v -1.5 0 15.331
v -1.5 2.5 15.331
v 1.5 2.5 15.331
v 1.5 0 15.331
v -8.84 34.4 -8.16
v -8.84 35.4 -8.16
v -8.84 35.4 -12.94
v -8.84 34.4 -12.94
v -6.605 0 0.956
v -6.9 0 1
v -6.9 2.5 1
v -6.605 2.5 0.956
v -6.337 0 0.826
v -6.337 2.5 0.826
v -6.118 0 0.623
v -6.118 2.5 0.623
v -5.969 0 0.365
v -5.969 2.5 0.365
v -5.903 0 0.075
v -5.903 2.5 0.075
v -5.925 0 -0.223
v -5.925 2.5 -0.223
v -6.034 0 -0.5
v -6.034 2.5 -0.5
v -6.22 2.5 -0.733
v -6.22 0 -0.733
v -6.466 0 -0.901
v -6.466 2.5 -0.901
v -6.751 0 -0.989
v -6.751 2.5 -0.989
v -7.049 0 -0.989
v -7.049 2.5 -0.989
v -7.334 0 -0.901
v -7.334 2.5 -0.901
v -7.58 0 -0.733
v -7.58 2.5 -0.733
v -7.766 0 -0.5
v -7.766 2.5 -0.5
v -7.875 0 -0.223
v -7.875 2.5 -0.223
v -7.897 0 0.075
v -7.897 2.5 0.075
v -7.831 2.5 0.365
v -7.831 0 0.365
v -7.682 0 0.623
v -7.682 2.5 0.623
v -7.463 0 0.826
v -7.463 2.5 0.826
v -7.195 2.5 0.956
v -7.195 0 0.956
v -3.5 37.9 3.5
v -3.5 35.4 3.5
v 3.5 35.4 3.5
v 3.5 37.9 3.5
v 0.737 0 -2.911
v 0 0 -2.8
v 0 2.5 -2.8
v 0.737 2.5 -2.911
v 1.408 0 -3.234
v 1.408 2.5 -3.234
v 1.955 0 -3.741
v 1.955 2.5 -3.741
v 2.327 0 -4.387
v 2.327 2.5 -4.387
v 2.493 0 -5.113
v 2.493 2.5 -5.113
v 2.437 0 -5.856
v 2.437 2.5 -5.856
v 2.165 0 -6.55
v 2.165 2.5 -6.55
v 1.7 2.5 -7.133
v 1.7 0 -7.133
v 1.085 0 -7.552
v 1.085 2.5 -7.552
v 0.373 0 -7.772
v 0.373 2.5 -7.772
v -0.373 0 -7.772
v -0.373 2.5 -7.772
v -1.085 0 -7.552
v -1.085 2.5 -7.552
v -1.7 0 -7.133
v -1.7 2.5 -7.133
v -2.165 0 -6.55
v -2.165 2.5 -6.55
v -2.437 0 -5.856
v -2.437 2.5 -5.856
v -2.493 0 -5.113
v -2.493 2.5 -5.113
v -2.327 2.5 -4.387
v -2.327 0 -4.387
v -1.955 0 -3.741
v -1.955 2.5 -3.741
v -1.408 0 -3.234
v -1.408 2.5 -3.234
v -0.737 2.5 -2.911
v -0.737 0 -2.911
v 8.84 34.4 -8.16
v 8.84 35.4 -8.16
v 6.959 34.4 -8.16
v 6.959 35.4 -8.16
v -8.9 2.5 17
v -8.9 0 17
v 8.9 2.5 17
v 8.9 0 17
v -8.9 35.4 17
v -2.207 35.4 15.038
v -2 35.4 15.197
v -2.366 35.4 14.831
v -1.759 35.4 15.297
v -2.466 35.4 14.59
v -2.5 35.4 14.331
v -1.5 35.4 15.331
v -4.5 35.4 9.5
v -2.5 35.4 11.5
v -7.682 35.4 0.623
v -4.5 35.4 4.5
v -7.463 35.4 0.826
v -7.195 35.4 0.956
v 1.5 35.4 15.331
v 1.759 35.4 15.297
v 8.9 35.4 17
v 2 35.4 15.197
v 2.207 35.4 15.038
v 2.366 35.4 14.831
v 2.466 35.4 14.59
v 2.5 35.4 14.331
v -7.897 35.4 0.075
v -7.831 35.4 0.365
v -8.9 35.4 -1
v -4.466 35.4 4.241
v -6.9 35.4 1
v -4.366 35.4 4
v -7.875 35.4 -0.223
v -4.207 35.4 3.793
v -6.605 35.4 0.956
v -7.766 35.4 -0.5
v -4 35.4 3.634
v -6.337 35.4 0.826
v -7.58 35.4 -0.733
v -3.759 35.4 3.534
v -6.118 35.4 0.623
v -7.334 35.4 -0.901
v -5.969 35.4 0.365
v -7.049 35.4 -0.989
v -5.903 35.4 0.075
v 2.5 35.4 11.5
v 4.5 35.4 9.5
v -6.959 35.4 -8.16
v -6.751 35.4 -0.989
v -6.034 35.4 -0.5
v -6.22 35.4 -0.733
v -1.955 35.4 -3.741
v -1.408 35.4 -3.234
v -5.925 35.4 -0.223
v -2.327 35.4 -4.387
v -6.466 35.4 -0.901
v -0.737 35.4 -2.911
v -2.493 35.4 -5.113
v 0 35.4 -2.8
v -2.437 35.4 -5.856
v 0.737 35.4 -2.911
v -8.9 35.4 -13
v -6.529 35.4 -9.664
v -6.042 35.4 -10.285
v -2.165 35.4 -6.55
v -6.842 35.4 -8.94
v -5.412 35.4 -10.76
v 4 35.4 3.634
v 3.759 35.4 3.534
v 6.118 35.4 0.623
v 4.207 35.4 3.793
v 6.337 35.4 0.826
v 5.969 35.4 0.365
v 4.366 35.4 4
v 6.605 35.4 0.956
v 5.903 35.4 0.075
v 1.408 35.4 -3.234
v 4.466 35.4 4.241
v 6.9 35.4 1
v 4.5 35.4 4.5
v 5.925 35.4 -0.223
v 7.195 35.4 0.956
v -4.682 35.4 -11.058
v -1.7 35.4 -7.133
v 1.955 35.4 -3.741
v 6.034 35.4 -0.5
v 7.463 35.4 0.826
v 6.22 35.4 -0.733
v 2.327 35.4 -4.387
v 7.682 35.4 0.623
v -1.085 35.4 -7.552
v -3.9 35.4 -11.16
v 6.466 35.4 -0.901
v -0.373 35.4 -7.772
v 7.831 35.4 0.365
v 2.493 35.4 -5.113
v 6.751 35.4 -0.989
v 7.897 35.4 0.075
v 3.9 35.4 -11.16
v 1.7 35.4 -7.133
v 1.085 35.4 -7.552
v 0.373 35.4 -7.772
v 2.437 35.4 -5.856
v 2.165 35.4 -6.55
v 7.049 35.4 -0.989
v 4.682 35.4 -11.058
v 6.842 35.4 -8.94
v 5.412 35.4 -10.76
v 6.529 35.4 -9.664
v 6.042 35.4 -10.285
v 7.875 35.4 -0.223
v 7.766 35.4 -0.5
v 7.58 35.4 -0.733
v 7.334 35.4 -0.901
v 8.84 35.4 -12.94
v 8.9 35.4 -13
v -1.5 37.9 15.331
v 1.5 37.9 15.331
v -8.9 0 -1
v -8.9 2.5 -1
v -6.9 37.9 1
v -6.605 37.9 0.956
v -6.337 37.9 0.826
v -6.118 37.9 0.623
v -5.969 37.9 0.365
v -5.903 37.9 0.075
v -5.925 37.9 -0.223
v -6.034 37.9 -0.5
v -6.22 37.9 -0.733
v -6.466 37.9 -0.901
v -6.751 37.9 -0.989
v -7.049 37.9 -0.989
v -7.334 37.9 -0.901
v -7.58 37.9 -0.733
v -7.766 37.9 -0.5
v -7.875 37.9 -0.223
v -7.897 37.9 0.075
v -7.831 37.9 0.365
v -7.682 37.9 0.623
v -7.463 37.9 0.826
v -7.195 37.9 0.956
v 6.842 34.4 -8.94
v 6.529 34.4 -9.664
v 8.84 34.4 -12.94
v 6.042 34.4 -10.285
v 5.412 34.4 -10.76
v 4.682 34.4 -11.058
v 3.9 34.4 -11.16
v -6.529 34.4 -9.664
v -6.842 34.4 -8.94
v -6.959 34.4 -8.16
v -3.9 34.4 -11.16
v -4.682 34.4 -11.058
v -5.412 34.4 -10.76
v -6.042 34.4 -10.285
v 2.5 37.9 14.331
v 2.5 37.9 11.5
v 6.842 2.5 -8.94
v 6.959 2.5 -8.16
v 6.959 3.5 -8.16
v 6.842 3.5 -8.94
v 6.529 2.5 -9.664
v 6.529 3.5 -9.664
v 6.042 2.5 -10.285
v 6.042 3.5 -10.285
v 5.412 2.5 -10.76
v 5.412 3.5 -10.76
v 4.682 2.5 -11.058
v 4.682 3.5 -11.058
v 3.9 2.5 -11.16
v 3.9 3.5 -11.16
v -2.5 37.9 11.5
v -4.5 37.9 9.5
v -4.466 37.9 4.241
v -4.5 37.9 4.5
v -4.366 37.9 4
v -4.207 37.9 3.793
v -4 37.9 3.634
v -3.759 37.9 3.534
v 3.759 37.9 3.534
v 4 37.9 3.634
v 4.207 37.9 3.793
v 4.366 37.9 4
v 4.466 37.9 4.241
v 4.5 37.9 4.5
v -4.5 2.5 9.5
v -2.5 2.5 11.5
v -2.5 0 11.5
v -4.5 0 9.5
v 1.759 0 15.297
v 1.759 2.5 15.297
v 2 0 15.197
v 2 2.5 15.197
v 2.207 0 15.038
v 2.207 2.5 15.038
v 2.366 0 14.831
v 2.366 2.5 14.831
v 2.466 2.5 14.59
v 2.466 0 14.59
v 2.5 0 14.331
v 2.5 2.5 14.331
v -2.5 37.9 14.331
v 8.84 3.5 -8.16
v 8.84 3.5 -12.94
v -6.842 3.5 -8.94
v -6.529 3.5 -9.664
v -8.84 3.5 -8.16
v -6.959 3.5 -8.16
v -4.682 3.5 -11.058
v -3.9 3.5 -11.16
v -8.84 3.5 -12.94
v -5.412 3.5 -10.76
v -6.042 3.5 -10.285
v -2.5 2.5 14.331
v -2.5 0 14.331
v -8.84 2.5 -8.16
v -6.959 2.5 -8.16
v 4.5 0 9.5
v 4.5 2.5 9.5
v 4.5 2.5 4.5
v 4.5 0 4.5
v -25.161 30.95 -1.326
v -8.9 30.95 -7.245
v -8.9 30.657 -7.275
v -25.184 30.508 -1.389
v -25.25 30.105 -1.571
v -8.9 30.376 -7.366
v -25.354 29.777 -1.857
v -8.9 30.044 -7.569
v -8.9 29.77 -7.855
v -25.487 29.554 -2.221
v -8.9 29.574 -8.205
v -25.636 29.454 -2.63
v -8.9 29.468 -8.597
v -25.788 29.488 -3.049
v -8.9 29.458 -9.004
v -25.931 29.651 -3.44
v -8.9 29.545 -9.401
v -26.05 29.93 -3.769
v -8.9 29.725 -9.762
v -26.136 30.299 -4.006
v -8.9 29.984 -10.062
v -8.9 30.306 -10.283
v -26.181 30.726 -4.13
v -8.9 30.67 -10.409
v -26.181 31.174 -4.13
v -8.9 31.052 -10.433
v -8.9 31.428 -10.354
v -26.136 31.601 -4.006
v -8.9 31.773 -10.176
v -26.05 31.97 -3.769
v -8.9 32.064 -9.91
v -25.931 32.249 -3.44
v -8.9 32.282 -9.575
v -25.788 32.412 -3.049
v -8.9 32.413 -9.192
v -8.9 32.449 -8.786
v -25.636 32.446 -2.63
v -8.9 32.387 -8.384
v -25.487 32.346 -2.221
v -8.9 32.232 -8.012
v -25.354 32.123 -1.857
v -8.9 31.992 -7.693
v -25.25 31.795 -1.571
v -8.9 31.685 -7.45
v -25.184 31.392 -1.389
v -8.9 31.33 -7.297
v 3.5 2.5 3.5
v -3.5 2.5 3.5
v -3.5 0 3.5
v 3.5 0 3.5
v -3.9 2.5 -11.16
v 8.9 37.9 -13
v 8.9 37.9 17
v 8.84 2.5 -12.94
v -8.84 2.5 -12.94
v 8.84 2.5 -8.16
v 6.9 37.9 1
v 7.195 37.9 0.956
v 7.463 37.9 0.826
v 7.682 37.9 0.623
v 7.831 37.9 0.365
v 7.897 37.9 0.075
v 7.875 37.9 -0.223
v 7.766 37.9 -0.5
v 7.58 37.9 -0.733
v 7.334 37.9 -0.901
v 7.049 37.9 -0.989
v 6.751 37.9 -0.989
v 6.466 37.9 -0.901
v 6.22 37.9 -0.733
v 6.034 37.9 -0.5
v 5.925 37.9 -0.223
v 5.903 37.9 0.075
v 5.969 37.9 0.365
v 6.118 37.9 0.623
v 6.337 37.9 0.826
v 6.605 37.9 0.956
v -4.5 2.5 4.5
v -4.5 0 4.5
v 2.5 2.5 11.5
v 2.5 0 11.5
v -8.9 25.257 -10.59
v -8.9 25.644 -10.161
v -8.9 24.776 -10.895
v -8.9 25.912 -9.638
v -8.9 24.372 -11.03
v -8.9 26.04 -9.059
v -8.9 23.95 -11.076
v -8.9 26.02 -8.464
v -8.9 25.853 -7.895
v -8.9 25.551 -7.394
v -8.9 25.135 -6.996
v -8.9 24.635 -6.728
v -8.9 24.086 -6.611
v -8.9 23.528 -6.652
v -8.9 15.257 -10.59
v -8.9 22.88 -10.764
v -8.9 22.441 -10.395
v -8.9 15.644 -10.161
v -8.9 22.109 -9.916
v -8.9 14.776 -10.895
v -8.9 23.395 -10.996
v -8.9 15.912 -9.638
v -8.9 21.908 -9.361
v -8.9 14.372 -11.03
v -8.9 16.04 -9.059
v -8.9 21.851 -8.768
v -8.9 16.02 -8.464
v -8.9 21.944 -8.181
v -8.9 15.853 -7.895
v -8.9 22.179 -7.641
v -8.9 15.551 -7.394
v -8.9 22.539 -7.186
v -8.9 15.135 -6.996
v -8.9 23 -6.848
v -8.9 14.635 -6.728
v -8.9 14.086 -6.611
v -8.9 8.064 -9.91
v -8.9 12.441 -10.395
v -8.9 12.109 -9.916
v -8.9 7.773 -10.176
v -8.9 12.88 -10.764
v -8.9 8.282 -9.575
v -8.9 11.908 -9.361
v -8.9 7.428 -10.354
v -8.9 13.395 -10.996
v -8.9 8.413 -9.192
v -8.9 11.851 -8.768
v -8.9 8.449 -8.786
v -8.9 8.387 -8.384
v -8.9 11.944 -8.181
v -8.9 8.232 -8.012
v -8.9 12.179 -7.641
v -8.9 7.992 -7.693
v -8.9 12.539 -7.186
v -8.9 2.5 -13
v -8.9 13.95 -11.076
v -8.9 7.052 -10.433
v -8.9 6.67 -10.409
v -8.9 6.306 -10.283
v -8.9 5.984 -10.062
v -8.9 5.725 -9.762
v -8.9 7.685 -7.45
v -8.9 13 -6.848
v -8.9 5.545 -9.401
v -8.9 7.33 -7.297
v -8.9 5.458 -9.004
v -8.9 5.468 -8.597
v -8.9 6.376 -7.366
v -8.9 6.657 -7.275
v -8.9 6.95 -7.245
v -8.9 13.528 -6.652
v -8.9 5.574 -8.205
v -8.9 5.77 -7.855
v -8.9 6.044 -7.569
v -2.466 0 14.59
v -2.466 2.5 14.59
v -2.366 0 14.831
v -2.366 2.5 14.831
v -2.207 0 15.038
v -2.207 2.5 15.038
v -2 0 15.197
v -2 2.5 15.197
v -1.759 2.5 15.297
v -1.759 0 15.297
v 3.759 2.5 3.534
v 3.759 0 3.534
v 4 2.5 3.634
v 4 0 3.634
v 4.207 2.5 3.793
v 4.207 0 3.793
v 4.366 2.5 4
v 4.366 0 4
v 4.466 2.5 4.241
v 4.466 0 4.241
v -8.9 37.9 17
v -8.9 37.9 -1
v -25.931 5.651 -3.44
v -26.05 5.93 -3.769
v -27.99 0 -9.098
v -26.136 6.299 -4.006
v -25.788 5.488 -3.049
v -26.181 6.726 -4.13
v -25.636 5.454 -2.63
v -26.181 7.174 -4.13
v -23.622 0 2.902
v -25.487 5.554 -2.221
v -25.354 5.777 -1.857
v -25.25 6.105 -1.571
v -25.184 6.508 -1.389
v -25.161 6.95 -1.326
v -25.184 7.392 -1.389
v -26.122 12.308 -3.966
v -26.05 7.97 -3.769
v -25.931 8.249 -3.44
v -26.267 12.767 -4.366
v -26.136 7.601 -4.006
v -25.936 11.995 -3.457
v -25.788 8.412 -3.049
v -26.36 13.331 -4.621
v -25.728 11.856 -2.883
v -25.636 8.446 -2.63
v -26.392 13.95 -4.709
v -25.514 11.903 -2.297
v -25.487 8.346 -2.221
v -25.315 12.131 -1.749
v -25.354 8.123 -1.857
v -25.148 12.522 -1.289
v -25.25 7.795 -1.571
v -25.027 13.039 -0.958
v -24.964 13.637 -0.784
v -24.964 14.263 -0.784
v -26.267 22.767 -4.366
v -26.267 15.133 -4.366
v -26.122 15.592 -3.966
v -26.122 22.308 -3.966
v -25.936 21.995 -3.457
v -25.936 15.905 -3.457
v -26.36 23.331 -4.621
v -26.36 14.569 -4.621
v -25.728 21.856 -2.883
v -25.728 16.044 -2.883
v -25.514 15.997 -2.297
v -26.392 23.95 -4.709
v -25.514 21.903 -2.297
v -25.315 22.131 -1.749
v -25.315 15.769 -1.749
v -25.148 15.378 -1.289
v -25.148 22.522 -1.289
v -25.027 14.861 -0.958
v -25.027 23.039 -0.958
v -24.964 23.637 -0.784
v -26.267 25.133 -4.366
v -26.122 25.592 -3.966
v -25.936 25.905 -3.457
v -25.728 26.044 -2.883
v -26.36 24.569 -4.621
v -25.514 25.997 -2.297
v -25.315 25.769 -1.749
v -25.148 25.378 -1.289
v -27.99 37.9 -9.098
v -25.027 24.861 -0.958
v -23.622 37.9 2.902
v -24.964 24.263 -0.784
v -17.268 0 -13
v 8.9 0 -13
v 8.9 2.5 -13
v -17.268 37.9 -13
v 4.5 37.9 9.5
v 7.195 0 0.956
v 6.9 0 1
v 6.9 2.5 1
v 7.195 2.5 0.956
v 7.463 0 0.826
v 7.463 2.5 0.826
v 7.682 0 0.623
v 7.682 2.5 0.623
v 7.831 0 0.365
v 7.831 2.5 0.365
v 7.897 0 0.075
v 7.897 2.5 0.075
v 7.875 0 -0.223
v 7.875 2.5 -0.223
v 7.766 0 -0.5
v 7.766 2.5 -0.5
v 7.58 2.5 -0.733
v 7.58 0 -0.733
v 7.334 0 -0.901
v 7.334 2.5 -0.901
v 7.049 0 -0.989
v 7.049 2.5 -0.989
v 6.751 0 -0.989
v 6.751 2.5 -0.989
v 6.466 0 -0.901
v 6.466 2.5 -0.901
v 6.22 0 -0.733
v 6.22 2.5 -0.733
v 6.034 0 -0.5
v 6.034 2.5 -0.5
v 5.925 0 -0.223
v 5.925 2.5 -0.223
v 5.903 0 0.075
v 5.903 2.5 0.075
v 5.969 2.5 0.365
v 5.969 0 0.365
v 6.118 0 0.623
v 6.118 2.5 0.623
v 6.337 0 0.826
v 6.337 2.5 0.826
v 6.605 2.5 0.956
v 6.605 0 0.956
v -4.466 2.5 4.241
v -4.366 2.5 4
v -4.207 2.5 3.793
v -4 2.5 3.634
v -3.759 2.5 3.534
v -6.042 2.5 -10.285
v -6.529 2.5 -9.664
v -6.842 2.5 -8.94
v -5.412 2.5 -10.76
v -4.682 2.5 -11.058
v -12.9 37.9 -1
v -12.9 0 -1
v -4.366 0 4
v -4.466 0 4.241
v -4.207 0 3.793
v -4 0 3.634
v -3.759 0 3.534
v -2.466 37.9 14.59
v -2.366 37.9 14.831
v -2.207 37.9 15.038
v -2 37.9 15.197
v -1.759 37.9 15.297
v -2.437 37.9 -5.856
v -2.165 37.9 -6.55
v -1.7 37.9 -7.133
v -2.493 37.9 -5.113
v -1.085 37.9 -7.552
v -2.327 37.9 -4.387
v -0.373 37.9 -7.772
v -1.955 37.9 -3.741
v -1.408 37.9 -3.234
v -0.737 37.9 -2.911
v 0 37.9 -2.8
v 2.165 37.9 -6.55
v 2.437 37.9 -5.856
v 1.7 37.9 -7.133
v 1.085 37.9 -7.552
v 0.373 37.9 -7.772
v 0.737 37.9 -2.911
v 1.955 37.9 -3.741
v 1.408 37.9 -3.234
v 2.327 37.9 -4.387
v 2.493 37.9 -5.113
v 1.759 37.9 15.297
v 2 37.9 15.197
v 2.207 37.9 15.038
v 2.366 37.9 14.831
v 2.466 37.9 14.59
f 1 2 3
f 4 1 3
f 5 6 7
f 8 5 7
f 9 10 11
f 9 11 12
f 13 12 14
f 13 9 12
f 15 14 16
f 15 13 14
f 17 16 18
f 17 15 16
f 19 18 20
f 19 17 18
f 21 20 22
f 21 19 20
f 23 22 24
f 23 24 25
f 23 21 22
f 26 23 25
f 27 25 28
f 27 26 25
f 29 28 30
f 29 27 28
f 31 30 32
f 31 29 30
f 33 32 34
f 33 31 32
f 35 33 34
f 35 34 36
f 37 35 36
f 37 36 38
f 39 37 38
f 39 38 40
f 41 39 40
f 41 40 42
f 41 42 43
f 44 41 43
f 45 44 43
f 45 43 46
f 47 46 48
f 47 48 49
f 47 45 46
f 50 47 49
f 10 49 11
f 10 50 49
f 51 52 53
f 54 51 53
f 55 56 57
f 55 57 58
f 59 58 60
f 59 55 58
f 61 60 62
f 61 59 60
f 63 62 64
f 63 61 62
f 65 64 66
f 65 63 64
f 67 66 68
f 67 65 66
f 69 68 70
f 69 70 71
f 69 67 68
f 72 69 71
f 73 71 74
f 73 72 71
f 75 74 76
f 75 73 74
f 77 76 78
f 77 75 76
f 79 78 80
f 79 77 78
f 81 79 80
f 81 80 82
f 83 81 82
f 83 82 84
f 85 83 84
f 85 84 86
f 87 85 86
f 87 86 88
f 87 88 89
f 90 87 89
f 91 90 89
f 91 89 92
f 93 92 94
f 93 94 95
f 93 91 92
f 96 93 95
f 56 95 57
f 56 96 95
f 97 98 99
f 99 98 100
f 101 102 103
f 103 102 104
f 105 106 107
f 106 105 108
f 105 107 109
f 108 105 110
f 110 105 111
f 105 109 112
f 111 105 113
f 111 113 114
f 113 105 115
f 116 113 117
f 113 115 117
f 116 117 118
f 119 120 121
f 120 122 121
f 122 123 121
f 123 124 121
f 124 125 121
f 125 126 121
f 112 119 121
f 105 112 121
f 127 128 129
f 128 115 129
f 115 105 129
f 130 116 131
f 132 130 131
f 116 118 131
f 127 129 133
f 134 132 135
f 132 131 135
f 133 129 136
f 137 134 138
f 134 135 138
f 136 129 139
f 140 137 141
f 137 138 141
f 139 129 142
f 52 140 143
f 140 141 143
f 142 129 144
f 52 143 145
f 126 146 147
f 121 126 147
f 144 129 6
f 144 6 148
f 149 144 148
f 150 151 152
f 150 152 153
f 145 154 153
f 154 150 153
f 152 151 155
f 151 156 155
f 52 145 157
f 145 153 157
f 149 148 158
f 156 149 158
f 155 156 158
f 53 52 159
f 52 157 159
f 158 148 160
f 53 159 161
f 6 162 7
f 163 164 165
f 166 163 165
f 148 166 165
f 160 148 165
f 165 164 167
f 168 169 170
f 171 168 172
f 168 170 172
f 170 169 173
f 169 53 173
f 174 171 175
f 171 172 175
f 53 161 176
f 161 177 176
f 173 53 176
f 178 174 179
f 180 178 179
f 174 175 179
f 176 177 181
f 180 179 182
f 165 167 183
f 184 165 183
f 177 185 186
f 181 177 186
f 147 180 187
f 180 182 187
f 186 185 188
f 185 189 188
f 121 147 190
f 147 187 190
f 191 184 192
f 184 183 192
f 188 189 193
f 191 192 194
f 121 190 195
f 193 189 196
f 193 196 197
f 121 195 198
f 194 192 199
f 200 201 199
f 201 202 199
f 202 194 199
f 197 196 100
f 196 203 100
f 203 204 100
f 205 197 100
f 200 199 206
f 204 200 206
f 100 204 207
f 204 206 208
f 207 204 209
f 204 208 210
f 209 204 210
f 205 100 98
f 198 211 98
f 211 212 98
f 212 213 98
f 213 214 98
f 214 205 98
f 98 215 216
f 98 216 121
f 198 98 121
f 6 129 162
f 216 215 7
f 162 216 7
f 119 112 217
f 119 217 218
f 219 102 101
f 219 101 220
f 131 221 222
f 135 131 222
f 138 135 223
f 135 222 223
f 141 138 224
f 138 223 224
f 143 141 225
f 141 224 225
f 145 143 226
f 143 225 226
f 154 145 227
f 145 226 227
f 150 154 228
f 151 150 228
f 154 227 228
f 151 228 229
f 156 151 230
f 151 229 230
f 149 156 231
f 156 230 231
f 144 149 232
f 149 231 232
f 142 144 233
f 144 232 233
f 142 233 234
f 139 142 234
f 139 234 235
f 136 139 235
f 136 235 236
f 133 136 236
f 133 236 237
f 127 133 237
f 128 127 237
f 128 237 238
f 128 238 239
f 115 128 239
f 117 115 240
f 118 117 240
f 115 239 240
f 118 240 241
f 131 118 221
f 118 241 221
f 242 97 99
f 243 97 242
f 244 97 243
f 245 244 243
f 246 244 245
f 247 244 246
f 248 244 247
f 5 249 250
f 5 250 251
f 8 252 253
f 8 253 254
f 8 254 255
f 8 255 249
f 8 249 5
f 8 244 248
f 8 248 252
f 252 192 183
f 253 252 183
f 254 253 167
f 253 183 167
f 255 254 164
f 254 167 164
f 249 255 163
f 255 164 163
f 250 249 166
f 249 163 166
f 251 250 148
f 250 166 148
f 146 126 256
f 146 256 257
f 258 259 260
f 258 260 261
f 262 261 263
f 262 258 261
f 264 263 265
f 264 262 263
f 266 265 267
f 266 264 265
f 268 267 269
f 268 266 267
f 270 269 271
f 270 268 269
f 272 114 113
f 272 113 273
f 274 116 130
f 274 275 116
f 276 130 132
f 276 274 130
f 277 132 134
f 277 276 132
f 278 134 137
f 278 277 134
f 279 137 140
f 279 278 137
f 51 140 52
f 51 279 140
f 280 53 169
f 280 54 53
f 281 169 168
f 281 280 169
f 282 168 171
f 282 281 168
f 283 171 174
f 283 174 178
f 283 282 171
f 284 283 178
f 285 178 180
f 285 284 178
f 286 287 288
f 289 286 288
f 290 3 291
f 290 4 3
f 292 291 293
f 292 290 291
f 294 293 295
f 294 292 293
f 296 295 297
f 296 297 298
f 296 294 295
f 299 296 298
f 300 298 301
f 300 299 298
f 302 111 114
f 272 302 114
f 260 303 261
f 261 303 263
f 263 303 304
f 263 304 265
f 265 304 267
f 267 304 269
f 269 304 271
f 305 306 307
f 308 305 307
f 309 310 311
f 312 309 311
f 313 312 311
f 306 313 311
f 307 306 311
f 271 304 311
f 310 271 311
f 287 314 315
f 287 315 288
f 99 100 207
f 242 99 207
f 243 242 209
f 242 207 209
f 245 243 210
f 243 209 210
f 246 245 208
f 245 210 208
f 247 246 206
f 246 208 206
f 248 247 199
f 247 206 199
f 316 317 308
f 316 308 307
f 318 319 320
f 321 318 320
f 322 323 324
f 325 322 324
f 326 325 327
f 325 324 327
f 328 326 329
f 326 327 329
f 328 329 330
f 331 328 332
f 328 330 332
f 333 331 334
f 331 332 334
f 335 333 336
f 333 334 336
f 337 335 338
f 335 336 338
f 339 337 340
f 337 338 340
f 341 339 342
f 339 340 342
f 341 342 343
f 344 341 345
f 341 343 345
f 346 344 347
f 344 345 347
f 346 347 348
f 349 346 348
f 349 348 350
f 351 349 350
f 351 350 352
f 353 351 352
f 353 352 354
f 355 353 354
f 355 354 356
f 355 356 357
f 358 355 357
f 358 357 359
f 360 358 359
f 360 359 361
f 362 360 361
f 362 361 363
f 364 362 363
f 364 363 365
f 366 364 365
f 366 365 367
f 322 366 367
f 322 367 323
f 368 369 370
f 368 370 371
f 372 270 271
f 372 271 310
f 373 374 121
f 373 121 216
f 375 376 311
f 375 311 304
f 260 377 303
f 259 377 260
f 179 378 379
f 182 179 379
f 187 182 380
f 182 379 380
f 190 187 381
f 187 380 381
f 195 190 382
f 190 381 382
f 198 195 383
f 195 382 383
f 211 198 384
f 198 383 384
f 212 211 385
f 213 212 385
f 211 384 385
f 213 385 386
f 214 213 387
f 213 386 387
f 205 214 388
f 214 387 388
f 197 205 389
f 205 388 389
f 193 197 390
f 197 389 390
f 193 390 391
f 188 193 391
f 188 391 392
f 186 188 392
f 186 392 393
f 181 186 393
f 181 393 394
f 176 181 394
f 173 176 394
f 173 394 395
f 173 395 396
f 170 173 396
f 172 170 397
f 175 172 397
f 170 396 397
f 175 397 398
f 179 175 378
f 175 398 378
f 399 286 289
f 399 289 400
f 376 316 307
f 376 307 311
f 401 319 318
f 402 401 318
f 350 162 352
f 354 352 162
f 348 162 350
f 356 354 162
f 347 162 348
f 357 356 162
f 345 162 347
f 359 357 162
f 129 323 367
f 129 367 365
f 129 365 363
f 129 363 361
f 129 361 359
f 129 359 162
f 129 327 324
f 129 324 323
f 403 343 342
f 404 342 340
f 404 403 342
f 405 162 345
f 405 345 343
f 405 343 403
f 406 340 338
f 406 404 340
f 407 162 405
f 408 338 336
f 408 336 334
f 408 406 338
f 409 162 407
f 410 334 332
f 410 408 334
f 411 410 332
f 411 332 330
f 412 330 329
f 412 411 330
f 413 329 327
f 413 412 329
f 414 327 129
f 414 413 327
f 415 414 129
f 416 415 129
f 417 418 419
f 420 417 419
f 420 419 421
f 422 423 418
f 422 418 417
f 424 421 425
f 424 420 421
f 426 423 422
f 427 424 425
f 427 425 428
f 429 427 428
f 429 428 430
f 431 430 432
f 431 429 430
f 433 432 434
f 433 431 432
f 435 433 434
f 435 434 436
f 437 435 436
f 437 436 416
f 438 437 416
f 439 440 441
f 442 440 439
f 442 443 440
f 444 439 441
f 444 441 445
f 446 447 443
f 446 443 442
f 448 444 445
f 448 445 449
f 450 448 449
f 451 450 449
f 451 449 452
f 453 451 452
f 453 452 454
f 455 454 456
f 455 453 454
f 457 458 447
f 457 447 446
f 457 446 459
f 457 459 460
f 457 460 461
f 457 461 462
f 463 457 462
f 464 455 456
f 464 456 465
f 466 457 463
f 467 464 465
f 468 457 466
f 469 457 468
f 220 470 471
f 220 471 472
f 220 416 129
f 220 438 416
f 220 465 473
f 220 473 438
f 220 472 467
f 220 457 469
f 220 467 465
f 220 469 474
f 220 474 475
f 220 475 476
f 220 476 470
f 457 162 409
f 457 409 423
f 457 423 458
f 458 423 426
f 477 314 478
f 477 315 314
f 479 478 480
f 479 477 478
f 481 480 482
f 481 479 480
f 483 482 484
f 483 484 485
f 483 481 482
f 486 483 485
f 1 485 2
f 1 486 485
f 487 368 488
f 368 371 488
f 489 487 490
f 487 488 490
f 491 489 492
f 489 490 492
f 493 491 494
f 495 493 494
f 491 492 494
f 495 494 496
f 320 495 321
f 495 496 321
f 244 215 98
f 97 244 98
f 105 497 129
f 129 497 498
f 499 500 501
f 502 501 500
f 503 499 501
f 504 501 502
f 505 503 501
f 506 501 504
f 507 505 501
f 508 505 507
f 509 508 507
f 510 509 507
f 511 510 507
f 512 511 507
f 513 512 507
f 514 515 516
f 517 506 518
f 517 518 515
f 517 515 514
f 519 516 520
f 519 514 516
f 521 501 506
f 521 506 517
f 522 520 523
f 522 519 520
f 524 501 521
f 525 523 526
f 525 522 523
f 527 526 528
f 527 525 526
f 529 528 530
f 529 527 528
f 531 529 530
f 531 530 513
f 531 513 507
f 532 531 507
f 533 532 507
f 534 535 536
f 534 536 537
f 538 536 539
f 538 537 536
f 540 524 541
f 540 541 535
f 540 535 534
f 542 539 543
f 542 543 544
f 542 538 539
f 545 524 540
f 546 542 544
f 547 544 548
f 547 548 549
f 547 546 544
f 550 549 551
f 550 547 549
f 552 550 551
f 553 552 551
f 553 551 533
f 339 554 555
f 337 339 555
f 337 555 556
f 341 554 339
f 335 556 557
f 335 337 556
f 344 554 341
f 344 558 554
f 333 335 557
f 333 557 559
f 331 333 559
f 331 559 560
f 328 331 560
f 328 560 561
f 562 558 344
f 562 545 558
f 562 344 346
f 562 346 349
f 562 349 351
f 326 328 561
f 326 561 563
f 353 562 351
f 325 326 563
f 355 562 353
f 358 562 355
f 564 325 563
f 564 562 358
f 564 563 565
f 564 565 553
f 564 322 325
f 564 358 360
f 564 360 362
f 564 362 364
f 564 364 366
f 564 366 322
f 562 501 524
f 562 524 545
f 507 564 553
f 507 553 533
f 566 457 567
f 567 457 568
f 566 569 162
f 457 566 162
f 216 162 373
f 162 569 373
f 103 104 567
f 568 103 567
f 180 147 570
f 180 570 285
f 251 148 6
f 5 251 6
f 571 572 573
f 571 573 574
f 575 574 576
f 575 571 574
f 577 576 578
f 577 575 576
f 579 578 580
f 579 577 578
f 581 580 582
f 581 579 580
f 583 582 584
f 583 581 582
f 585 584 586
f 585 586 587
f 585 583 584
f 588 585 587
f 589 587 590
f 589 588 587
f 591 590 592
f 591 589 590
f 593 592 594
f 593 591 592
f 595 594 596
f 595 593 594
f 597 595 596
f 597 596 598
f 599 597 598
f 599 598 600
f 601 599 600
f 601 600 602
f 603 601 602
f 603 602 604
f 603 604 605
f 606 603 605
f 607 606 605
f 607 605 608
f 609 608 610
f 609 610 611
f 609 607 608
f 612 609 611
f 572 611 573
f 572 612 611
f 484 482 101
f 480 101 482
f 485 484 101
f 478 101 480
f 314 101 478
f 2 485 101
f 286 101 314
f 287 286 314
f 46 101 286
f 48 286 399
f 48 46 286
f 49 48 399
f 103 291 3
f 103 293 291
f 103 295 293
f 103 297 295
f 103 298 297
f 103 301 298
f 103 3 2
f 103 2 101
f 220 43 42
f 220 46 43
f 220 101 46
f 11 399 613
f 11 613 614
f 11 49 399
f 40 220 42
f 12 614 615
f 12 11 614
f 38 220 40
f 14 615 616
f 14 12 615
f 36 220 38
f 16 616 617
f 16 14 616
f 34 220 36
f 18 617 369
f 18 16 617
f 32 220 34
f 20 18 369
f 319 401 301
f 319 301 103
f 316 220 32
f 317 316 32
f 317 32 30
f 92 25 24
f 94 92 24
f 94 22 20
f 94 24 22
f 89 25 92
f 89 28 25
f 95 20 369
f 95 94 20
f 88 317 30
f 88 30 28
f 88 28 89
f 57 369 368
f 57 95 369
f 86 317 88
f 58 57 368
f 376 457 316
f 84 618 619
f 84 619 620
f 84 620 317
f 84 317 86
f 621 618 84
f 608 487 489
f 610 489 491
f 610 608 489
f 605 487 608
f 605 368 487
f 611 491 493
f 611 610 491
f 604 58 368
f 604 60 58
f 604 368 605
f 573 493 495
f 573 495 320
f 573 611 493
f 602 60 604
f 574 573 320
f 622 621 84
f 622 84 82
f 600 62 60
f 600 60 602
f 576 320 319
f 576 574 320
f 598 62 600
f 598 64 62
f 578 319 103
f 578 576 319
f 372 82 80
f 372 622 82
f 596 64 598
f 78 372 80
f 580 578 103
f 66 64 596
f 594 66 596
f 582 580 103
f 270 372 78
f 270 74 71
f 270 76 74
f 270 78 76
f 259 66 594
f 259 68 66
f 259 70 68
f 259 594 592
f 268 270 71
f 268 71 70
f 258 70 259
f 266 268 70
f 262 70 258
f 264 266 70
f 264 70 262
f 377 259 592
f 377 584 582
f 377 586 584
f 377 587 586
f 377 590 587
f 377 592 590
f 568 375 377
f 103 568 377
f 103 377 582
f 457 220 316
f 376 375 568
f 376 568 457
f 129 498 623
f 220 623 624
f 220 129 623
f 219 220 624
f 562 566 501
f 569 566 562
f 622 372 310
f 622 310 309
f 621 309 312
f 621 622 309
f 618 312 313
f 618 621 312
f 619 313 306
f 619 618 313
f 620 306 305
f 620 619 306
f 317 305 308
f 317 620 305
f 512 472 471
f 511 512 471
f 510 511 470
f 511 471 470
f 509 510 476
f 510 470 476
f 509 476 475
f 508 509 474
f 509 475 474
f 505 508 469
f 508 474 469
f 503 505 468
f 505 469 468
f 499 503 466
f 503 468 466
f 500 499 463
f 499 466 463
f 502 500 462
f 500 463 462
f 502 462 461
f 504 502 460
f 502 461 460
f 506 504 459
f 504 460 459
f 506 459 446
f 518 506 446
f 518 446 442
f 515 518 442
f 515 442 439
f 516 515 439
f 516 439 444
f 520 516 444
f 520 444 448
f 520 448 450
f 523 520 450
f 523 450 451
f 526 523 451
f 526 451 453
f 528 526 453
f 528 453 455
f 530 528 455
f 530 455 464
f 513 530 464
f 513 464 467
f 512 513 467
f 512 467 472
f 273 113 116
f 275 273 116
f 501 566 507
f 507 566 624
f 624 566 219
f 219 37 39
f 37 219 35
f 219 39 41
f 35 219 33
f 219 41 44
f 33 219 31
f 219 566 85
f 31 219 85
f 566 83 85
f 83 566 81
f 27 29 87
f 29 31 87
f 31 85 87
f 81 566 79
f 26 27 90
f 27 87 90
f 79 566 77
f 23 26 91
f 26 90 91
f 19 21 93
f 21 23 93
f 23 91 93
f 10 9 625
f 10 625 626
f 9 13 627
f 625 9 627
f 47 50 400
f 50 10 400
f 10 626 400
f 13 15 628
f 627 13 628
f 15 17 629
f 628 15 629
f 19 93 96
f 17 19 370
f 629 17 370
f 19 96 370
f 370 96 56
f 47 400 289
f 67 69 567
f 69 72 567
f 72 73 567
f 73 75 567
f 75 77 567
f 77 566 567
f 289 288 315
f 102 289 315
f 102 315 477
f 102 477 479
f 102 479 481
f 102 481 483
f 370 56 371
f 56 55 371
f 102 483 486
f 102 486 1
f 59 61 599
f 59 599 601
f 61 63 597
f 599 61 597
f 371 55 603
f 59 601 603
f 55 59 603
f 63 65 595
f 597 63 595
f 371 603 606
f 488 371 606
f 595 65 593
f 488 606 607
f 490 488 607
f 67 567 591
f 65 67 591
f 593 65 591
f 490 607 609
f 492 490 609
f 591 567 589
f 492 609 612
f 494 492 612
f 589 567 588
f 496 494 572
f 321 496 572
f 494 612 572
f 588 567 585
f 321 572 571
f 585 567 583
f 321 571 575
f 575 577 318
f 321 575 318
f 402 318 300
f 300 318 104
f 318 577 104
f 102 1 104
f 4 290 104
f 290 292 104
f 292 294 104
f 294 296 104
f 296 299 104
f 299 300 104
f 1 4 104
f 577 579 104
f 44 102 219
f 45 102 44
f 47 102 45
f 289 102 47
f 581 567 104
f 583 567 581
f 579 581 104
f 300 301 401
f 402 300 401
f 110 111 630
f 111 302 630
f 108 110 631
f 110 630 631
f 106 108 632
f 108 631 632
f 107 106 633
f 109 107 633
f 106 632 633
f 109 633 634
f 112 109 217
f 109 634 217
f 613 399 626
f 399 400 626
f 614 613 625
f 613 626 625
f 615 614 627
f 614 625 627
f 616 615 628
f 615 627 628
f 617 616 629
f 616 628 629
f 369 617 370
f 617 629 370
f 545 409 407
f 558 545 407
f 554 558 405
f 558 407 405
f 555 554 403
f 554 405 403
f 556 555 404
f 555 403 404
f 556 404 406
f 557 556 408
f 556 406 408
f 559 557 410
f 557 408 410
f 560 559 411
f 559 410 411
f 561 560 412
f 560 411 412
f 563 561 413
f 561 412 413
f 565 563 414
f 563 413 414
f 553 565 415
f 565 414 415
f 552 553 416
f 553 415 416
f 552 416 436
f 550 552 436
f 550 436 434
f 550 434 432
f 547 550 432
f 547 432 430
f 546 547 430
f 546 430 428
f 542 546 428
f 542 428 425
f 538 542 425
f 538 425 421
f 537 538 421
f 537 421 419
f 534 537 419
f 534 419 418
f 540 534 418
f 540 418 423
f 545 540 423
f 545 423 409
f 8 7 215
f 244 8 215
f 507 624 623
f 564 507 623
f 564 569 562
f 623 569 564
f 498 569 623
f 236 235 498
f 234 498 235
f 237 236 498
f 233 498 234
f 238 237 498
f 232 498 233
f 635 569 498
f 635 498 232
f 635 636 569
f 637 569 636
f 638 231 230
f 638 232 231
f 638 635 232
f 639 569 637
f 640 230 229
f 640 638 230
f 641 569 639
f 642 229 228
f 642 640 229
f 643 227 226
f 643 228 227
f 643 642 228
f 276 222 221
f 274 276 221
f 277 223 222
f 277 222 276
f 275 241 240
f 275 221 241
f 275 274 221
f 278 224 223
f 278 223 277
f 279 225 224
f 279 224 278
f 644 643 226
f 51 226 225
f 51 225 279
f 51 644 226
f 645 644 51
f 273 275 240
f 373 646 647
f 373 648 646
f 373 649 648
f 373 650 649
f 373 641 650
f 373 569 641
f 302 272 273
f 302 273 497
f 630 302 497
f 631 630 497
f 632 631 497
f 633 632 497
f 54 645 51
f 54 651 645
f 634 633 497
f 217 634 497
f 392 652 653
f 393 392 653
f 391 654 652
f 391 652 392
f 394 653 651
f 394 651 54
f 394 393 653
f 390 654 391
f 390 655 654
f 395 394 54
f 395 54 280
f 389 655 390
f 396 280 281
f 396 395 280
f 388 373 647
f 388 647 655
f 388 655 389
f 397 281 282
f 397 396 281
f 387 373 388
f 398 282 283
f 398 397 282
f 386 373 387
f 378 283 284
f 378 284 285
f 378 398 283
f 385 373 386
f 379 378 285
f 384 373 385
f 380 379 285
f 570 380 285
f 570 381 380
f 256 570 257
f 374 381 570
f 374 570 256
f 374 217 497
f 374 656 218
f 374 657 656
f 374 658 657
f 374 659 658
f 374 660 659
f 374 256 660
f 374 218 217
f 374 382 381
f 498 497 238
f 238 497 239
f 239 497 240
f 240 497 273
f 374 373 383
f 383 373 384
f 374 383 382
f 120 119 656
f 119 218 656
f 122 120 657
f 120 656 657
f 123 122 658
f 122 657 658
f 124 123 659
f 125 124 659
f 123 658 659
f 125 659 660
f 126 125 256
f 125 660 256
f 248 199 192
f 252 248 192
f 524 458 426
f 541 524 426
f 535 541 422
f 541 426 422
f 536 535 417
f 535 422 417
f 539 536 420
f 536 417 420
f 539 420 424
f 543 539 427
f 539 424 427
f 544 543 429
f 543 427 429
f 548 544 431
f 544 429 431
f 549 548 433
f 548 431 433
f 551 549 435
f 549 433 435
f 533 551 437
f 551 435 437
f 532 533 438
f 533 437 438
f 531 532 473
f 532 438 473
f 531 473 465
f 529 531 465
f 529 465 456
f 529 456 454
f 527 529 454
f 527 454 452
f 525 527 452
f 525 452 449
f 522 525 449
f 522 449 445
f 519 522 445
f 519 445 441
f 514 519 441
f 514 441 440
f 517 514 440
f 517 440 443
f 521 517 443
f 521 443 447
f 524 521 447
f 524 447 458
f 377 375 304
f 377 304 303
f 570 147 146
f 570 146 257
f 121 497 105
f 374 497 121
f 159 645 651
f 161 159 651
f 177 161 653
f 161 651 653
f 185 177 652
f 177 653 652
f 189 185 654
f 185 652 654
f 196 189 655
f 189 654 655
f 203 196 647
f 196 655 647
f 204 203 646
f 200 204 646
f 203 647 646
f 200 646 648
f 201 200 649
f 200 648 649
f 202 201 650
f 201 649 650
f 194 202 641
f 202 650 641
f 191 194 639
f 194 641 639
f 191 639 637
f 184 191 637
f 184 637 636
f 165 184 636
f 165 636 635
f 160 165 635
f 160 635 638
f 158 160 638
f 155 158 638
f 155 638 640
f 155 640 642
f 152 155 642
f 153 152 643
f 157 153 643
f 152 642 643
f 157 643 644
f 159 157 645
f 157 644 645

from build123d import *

# Parameters (mm, degrees)
SKETCH1_W                  = 17.8
SKETCH1_H                  = 30
SKETCH1_R                  = 1
SKETCH1_R_2                = 2.5
BOSS_EXTRUDE1_DEPTH        = 2.5
SKETCH2_W                  = 9
SKETCH2_H                  = 6
SKETCH2_W_2                = 5
SKETCH2_H_2                = 5.830943002
CUT_EXTRUDE1_DEPTH         = 20.350968968
CHAMFER1_SIZE              = 2
FILLET1_R                  = 1
BOSS_EXTRUDE2_DEPTH        = 1
SKETCH4_W                  = 12
SKETCH4_H                  = 18.95
BOSS_EXTRUDE3_DEPTH        = 4
BOSS_EXTRUDE4_DEPTH        = 37.9
SKETCH6_W                  = 12.770133269
SKETCH6_H                  = 37.9
BOSS_EXTRUDE5_DEPTH        = 11.41
F_3_0_MM_DOWEL_HOLES1_D    = 3
F_4_2_4_2_DIAMETER_HOLE1_D = 4.2


with BuildPart() as part:
    # Sketch1 → Boss-Extrude1 (new body)
    with BuildSketch(Plane(origin=(0, 0, 0), x_dir=(1, 0, 0), z_dir=(0, 1, 0))):
        with Locations((0, -2)):
            Rectangle(SKETCH1_W, SKETCH1_H)
        with Locations(Location((-6.9, 0, 0), (0, 0, 270))):
            Circle(SKETCH1_R, mode=Mode.SUBTRACT)
        with Locations(Location((6.9, 0, 0), (0, 0, 270))):
            Circle(SKETCH1_R, mode=Mode.SUBTRACT)
        with Locations(Location((0, 5.3, 0), (0, 0, 270))):
            Circle(SKETCH1_R_2, mode=Mode.SUBTRACT)
    extrude(amount=BOSS_EXTRUDE1_DEPTH)

    # Sketch2 → Cut-Extrude1 (cut, through all)
    with BuildSketch(Plane(origin=(0, 2.5, 0), x_dir=(1, 0, 0), z_dir=(0, 1, 0))):
        with Locations((0, -6.5)):
            Rectangle(SKETCH2_W, SKETCH2_H)
        with Locations((0, -12.415471501)):
            Rectangle(SKETCH2_W_2, SKETCH2_H_2)
    extrude(amount=-CUT_EXTRUDE1_DEPTH, mode=Mode.SUBTRACT)

    # Chamfer1
    chamfer1_edges = [part.edges().sort_by_distance(p)[0] for p in [
        (2.5, 1.25, 9.5),
        (-2.5, 1.25, 9.5),
    ]]
    chamfer(chamfer1_edges, length=CHAMFER1_SIZE - 0.0001)  # a hair under: the kernel refuses the full size

    # Fillet1
    fillet1_edges = [part.edges().sort_by_distance(p)[0] for p in [
        (4.5, 1.25, 3.5),
        (2.5, 1.25, 15.330943002),
        (-2.5, 1.25, 15.330943002),
        (-4.5, 1.25, 3.5),
    ]]
    fillet(fillet1_edges, radius=FILLET1_R)

    # Sketch3 → Boss-Extrude2 (add)
    with BuildSketch(Plane(origin=(0, 2.5, 0), x_dir=(1, 0, 0), z_dir=(0, 1, 0))):
        with BuildLine():
            Line((8.84, 8.16), (6.959390471, 8.16))
            ThreePointArc((6.959390471, 8.16), (6.042112051, 10.284532913), (3.900010938, 11.159999998))
            Line((3.900010938, 11.159999998), (-3.900010938, 11.159999998))
            ThreePointArc((-3.900010938, 11.159999998), (-6.04211205, 10.284532912), (-6.959390471, 8.16))
            Line((-6.959390471, 8.16), (-8.84, 8.16))
            Line((-8.84, 8.16), (-8.84, 12.94))
            Line((-8.84, 12.94), (8.84, 12.94))
            Line((8.84, 12.94), (8.84, 8.16))
        make_face()
    extrude(amount=BOSS_EXTRUDE2_DEPTH)

    # Sketch4 → Boss-Extrude3 (add)
    with BuildSketch(Plane.ZY.offset(8.9)):
        with Locations((-7, 9.475)):
            Rectangle(SKETCH4_W, SKETCH4_H)
    extrude(amount=BOSS_EXTRUDE3_DEPTH)

    # Mirror2: part across plane


with BuildPart() as part_1:
    add(part.part)
    add(part.part.mirror(Plane.ZX.offset(18.95)))

    # Sketch5 → Boss-Extrude4 (add)
    with BuildSketch(Plane(origin=(0, 37.9, 0), x_dir=(1, 0, 0), z_dir=(0, 1, 0))):
        Polygon((-12.9, 1), (-17.267642811, 13), (-12.9, 13), align=None)
    extrude(amount=-BOSS_EXTRUDE4_DEPTH)

    # Sketch6 → Boss-Extrude5 (add)
    with BuildSketch(Plane(origin=(-11.069592853, 0, 4.029002304), x_dir=(0.3420201433256634, 0, 0.9396926207859103), z_dir=(-0.9396926207859103, 0, 0.3420201433256634))):
        with Locations((-11.736819105, 18.95)):
            Rectangle(SKETCH6_W, SKETCH6_H)
    extrude(amount=BOSS_EXTRUDE5_DEPTH)

    # Ø3.0 mm Dowel Holes1 (through all)
    with Locations(Plane(origin=(-23.72675034, 0, 2.614356121), x_dir=(-0.34202014332566333, 0, -0.9396926207859103), z_dir=(-0.9396926207859104, 0, 0.3420201433256634))):
        with Locations((5.693417073, -6.95), (5.693417073, -30.95)):
            Hole(F_3_0_MM_DOWEL_HOLES1_D / 2)

    # Ø4.2 (4.2) Diameter Hole1 (through all)
    with Locations(Plane(origin=(-21.791485656, 0, 7.931452139), x_dir=(0.34202014332566333, 0, 0.9396926207859103), z_dir=(-0.9396926207859104, 0, 0.3420201433256634))):
        with Locations((-11.35175247, 13.95), (-11.35175247, 23.95)):
            Hole(F_4_2_4_2_DIAMETER_HOLE1_D / 2)


solid = part_1.part
